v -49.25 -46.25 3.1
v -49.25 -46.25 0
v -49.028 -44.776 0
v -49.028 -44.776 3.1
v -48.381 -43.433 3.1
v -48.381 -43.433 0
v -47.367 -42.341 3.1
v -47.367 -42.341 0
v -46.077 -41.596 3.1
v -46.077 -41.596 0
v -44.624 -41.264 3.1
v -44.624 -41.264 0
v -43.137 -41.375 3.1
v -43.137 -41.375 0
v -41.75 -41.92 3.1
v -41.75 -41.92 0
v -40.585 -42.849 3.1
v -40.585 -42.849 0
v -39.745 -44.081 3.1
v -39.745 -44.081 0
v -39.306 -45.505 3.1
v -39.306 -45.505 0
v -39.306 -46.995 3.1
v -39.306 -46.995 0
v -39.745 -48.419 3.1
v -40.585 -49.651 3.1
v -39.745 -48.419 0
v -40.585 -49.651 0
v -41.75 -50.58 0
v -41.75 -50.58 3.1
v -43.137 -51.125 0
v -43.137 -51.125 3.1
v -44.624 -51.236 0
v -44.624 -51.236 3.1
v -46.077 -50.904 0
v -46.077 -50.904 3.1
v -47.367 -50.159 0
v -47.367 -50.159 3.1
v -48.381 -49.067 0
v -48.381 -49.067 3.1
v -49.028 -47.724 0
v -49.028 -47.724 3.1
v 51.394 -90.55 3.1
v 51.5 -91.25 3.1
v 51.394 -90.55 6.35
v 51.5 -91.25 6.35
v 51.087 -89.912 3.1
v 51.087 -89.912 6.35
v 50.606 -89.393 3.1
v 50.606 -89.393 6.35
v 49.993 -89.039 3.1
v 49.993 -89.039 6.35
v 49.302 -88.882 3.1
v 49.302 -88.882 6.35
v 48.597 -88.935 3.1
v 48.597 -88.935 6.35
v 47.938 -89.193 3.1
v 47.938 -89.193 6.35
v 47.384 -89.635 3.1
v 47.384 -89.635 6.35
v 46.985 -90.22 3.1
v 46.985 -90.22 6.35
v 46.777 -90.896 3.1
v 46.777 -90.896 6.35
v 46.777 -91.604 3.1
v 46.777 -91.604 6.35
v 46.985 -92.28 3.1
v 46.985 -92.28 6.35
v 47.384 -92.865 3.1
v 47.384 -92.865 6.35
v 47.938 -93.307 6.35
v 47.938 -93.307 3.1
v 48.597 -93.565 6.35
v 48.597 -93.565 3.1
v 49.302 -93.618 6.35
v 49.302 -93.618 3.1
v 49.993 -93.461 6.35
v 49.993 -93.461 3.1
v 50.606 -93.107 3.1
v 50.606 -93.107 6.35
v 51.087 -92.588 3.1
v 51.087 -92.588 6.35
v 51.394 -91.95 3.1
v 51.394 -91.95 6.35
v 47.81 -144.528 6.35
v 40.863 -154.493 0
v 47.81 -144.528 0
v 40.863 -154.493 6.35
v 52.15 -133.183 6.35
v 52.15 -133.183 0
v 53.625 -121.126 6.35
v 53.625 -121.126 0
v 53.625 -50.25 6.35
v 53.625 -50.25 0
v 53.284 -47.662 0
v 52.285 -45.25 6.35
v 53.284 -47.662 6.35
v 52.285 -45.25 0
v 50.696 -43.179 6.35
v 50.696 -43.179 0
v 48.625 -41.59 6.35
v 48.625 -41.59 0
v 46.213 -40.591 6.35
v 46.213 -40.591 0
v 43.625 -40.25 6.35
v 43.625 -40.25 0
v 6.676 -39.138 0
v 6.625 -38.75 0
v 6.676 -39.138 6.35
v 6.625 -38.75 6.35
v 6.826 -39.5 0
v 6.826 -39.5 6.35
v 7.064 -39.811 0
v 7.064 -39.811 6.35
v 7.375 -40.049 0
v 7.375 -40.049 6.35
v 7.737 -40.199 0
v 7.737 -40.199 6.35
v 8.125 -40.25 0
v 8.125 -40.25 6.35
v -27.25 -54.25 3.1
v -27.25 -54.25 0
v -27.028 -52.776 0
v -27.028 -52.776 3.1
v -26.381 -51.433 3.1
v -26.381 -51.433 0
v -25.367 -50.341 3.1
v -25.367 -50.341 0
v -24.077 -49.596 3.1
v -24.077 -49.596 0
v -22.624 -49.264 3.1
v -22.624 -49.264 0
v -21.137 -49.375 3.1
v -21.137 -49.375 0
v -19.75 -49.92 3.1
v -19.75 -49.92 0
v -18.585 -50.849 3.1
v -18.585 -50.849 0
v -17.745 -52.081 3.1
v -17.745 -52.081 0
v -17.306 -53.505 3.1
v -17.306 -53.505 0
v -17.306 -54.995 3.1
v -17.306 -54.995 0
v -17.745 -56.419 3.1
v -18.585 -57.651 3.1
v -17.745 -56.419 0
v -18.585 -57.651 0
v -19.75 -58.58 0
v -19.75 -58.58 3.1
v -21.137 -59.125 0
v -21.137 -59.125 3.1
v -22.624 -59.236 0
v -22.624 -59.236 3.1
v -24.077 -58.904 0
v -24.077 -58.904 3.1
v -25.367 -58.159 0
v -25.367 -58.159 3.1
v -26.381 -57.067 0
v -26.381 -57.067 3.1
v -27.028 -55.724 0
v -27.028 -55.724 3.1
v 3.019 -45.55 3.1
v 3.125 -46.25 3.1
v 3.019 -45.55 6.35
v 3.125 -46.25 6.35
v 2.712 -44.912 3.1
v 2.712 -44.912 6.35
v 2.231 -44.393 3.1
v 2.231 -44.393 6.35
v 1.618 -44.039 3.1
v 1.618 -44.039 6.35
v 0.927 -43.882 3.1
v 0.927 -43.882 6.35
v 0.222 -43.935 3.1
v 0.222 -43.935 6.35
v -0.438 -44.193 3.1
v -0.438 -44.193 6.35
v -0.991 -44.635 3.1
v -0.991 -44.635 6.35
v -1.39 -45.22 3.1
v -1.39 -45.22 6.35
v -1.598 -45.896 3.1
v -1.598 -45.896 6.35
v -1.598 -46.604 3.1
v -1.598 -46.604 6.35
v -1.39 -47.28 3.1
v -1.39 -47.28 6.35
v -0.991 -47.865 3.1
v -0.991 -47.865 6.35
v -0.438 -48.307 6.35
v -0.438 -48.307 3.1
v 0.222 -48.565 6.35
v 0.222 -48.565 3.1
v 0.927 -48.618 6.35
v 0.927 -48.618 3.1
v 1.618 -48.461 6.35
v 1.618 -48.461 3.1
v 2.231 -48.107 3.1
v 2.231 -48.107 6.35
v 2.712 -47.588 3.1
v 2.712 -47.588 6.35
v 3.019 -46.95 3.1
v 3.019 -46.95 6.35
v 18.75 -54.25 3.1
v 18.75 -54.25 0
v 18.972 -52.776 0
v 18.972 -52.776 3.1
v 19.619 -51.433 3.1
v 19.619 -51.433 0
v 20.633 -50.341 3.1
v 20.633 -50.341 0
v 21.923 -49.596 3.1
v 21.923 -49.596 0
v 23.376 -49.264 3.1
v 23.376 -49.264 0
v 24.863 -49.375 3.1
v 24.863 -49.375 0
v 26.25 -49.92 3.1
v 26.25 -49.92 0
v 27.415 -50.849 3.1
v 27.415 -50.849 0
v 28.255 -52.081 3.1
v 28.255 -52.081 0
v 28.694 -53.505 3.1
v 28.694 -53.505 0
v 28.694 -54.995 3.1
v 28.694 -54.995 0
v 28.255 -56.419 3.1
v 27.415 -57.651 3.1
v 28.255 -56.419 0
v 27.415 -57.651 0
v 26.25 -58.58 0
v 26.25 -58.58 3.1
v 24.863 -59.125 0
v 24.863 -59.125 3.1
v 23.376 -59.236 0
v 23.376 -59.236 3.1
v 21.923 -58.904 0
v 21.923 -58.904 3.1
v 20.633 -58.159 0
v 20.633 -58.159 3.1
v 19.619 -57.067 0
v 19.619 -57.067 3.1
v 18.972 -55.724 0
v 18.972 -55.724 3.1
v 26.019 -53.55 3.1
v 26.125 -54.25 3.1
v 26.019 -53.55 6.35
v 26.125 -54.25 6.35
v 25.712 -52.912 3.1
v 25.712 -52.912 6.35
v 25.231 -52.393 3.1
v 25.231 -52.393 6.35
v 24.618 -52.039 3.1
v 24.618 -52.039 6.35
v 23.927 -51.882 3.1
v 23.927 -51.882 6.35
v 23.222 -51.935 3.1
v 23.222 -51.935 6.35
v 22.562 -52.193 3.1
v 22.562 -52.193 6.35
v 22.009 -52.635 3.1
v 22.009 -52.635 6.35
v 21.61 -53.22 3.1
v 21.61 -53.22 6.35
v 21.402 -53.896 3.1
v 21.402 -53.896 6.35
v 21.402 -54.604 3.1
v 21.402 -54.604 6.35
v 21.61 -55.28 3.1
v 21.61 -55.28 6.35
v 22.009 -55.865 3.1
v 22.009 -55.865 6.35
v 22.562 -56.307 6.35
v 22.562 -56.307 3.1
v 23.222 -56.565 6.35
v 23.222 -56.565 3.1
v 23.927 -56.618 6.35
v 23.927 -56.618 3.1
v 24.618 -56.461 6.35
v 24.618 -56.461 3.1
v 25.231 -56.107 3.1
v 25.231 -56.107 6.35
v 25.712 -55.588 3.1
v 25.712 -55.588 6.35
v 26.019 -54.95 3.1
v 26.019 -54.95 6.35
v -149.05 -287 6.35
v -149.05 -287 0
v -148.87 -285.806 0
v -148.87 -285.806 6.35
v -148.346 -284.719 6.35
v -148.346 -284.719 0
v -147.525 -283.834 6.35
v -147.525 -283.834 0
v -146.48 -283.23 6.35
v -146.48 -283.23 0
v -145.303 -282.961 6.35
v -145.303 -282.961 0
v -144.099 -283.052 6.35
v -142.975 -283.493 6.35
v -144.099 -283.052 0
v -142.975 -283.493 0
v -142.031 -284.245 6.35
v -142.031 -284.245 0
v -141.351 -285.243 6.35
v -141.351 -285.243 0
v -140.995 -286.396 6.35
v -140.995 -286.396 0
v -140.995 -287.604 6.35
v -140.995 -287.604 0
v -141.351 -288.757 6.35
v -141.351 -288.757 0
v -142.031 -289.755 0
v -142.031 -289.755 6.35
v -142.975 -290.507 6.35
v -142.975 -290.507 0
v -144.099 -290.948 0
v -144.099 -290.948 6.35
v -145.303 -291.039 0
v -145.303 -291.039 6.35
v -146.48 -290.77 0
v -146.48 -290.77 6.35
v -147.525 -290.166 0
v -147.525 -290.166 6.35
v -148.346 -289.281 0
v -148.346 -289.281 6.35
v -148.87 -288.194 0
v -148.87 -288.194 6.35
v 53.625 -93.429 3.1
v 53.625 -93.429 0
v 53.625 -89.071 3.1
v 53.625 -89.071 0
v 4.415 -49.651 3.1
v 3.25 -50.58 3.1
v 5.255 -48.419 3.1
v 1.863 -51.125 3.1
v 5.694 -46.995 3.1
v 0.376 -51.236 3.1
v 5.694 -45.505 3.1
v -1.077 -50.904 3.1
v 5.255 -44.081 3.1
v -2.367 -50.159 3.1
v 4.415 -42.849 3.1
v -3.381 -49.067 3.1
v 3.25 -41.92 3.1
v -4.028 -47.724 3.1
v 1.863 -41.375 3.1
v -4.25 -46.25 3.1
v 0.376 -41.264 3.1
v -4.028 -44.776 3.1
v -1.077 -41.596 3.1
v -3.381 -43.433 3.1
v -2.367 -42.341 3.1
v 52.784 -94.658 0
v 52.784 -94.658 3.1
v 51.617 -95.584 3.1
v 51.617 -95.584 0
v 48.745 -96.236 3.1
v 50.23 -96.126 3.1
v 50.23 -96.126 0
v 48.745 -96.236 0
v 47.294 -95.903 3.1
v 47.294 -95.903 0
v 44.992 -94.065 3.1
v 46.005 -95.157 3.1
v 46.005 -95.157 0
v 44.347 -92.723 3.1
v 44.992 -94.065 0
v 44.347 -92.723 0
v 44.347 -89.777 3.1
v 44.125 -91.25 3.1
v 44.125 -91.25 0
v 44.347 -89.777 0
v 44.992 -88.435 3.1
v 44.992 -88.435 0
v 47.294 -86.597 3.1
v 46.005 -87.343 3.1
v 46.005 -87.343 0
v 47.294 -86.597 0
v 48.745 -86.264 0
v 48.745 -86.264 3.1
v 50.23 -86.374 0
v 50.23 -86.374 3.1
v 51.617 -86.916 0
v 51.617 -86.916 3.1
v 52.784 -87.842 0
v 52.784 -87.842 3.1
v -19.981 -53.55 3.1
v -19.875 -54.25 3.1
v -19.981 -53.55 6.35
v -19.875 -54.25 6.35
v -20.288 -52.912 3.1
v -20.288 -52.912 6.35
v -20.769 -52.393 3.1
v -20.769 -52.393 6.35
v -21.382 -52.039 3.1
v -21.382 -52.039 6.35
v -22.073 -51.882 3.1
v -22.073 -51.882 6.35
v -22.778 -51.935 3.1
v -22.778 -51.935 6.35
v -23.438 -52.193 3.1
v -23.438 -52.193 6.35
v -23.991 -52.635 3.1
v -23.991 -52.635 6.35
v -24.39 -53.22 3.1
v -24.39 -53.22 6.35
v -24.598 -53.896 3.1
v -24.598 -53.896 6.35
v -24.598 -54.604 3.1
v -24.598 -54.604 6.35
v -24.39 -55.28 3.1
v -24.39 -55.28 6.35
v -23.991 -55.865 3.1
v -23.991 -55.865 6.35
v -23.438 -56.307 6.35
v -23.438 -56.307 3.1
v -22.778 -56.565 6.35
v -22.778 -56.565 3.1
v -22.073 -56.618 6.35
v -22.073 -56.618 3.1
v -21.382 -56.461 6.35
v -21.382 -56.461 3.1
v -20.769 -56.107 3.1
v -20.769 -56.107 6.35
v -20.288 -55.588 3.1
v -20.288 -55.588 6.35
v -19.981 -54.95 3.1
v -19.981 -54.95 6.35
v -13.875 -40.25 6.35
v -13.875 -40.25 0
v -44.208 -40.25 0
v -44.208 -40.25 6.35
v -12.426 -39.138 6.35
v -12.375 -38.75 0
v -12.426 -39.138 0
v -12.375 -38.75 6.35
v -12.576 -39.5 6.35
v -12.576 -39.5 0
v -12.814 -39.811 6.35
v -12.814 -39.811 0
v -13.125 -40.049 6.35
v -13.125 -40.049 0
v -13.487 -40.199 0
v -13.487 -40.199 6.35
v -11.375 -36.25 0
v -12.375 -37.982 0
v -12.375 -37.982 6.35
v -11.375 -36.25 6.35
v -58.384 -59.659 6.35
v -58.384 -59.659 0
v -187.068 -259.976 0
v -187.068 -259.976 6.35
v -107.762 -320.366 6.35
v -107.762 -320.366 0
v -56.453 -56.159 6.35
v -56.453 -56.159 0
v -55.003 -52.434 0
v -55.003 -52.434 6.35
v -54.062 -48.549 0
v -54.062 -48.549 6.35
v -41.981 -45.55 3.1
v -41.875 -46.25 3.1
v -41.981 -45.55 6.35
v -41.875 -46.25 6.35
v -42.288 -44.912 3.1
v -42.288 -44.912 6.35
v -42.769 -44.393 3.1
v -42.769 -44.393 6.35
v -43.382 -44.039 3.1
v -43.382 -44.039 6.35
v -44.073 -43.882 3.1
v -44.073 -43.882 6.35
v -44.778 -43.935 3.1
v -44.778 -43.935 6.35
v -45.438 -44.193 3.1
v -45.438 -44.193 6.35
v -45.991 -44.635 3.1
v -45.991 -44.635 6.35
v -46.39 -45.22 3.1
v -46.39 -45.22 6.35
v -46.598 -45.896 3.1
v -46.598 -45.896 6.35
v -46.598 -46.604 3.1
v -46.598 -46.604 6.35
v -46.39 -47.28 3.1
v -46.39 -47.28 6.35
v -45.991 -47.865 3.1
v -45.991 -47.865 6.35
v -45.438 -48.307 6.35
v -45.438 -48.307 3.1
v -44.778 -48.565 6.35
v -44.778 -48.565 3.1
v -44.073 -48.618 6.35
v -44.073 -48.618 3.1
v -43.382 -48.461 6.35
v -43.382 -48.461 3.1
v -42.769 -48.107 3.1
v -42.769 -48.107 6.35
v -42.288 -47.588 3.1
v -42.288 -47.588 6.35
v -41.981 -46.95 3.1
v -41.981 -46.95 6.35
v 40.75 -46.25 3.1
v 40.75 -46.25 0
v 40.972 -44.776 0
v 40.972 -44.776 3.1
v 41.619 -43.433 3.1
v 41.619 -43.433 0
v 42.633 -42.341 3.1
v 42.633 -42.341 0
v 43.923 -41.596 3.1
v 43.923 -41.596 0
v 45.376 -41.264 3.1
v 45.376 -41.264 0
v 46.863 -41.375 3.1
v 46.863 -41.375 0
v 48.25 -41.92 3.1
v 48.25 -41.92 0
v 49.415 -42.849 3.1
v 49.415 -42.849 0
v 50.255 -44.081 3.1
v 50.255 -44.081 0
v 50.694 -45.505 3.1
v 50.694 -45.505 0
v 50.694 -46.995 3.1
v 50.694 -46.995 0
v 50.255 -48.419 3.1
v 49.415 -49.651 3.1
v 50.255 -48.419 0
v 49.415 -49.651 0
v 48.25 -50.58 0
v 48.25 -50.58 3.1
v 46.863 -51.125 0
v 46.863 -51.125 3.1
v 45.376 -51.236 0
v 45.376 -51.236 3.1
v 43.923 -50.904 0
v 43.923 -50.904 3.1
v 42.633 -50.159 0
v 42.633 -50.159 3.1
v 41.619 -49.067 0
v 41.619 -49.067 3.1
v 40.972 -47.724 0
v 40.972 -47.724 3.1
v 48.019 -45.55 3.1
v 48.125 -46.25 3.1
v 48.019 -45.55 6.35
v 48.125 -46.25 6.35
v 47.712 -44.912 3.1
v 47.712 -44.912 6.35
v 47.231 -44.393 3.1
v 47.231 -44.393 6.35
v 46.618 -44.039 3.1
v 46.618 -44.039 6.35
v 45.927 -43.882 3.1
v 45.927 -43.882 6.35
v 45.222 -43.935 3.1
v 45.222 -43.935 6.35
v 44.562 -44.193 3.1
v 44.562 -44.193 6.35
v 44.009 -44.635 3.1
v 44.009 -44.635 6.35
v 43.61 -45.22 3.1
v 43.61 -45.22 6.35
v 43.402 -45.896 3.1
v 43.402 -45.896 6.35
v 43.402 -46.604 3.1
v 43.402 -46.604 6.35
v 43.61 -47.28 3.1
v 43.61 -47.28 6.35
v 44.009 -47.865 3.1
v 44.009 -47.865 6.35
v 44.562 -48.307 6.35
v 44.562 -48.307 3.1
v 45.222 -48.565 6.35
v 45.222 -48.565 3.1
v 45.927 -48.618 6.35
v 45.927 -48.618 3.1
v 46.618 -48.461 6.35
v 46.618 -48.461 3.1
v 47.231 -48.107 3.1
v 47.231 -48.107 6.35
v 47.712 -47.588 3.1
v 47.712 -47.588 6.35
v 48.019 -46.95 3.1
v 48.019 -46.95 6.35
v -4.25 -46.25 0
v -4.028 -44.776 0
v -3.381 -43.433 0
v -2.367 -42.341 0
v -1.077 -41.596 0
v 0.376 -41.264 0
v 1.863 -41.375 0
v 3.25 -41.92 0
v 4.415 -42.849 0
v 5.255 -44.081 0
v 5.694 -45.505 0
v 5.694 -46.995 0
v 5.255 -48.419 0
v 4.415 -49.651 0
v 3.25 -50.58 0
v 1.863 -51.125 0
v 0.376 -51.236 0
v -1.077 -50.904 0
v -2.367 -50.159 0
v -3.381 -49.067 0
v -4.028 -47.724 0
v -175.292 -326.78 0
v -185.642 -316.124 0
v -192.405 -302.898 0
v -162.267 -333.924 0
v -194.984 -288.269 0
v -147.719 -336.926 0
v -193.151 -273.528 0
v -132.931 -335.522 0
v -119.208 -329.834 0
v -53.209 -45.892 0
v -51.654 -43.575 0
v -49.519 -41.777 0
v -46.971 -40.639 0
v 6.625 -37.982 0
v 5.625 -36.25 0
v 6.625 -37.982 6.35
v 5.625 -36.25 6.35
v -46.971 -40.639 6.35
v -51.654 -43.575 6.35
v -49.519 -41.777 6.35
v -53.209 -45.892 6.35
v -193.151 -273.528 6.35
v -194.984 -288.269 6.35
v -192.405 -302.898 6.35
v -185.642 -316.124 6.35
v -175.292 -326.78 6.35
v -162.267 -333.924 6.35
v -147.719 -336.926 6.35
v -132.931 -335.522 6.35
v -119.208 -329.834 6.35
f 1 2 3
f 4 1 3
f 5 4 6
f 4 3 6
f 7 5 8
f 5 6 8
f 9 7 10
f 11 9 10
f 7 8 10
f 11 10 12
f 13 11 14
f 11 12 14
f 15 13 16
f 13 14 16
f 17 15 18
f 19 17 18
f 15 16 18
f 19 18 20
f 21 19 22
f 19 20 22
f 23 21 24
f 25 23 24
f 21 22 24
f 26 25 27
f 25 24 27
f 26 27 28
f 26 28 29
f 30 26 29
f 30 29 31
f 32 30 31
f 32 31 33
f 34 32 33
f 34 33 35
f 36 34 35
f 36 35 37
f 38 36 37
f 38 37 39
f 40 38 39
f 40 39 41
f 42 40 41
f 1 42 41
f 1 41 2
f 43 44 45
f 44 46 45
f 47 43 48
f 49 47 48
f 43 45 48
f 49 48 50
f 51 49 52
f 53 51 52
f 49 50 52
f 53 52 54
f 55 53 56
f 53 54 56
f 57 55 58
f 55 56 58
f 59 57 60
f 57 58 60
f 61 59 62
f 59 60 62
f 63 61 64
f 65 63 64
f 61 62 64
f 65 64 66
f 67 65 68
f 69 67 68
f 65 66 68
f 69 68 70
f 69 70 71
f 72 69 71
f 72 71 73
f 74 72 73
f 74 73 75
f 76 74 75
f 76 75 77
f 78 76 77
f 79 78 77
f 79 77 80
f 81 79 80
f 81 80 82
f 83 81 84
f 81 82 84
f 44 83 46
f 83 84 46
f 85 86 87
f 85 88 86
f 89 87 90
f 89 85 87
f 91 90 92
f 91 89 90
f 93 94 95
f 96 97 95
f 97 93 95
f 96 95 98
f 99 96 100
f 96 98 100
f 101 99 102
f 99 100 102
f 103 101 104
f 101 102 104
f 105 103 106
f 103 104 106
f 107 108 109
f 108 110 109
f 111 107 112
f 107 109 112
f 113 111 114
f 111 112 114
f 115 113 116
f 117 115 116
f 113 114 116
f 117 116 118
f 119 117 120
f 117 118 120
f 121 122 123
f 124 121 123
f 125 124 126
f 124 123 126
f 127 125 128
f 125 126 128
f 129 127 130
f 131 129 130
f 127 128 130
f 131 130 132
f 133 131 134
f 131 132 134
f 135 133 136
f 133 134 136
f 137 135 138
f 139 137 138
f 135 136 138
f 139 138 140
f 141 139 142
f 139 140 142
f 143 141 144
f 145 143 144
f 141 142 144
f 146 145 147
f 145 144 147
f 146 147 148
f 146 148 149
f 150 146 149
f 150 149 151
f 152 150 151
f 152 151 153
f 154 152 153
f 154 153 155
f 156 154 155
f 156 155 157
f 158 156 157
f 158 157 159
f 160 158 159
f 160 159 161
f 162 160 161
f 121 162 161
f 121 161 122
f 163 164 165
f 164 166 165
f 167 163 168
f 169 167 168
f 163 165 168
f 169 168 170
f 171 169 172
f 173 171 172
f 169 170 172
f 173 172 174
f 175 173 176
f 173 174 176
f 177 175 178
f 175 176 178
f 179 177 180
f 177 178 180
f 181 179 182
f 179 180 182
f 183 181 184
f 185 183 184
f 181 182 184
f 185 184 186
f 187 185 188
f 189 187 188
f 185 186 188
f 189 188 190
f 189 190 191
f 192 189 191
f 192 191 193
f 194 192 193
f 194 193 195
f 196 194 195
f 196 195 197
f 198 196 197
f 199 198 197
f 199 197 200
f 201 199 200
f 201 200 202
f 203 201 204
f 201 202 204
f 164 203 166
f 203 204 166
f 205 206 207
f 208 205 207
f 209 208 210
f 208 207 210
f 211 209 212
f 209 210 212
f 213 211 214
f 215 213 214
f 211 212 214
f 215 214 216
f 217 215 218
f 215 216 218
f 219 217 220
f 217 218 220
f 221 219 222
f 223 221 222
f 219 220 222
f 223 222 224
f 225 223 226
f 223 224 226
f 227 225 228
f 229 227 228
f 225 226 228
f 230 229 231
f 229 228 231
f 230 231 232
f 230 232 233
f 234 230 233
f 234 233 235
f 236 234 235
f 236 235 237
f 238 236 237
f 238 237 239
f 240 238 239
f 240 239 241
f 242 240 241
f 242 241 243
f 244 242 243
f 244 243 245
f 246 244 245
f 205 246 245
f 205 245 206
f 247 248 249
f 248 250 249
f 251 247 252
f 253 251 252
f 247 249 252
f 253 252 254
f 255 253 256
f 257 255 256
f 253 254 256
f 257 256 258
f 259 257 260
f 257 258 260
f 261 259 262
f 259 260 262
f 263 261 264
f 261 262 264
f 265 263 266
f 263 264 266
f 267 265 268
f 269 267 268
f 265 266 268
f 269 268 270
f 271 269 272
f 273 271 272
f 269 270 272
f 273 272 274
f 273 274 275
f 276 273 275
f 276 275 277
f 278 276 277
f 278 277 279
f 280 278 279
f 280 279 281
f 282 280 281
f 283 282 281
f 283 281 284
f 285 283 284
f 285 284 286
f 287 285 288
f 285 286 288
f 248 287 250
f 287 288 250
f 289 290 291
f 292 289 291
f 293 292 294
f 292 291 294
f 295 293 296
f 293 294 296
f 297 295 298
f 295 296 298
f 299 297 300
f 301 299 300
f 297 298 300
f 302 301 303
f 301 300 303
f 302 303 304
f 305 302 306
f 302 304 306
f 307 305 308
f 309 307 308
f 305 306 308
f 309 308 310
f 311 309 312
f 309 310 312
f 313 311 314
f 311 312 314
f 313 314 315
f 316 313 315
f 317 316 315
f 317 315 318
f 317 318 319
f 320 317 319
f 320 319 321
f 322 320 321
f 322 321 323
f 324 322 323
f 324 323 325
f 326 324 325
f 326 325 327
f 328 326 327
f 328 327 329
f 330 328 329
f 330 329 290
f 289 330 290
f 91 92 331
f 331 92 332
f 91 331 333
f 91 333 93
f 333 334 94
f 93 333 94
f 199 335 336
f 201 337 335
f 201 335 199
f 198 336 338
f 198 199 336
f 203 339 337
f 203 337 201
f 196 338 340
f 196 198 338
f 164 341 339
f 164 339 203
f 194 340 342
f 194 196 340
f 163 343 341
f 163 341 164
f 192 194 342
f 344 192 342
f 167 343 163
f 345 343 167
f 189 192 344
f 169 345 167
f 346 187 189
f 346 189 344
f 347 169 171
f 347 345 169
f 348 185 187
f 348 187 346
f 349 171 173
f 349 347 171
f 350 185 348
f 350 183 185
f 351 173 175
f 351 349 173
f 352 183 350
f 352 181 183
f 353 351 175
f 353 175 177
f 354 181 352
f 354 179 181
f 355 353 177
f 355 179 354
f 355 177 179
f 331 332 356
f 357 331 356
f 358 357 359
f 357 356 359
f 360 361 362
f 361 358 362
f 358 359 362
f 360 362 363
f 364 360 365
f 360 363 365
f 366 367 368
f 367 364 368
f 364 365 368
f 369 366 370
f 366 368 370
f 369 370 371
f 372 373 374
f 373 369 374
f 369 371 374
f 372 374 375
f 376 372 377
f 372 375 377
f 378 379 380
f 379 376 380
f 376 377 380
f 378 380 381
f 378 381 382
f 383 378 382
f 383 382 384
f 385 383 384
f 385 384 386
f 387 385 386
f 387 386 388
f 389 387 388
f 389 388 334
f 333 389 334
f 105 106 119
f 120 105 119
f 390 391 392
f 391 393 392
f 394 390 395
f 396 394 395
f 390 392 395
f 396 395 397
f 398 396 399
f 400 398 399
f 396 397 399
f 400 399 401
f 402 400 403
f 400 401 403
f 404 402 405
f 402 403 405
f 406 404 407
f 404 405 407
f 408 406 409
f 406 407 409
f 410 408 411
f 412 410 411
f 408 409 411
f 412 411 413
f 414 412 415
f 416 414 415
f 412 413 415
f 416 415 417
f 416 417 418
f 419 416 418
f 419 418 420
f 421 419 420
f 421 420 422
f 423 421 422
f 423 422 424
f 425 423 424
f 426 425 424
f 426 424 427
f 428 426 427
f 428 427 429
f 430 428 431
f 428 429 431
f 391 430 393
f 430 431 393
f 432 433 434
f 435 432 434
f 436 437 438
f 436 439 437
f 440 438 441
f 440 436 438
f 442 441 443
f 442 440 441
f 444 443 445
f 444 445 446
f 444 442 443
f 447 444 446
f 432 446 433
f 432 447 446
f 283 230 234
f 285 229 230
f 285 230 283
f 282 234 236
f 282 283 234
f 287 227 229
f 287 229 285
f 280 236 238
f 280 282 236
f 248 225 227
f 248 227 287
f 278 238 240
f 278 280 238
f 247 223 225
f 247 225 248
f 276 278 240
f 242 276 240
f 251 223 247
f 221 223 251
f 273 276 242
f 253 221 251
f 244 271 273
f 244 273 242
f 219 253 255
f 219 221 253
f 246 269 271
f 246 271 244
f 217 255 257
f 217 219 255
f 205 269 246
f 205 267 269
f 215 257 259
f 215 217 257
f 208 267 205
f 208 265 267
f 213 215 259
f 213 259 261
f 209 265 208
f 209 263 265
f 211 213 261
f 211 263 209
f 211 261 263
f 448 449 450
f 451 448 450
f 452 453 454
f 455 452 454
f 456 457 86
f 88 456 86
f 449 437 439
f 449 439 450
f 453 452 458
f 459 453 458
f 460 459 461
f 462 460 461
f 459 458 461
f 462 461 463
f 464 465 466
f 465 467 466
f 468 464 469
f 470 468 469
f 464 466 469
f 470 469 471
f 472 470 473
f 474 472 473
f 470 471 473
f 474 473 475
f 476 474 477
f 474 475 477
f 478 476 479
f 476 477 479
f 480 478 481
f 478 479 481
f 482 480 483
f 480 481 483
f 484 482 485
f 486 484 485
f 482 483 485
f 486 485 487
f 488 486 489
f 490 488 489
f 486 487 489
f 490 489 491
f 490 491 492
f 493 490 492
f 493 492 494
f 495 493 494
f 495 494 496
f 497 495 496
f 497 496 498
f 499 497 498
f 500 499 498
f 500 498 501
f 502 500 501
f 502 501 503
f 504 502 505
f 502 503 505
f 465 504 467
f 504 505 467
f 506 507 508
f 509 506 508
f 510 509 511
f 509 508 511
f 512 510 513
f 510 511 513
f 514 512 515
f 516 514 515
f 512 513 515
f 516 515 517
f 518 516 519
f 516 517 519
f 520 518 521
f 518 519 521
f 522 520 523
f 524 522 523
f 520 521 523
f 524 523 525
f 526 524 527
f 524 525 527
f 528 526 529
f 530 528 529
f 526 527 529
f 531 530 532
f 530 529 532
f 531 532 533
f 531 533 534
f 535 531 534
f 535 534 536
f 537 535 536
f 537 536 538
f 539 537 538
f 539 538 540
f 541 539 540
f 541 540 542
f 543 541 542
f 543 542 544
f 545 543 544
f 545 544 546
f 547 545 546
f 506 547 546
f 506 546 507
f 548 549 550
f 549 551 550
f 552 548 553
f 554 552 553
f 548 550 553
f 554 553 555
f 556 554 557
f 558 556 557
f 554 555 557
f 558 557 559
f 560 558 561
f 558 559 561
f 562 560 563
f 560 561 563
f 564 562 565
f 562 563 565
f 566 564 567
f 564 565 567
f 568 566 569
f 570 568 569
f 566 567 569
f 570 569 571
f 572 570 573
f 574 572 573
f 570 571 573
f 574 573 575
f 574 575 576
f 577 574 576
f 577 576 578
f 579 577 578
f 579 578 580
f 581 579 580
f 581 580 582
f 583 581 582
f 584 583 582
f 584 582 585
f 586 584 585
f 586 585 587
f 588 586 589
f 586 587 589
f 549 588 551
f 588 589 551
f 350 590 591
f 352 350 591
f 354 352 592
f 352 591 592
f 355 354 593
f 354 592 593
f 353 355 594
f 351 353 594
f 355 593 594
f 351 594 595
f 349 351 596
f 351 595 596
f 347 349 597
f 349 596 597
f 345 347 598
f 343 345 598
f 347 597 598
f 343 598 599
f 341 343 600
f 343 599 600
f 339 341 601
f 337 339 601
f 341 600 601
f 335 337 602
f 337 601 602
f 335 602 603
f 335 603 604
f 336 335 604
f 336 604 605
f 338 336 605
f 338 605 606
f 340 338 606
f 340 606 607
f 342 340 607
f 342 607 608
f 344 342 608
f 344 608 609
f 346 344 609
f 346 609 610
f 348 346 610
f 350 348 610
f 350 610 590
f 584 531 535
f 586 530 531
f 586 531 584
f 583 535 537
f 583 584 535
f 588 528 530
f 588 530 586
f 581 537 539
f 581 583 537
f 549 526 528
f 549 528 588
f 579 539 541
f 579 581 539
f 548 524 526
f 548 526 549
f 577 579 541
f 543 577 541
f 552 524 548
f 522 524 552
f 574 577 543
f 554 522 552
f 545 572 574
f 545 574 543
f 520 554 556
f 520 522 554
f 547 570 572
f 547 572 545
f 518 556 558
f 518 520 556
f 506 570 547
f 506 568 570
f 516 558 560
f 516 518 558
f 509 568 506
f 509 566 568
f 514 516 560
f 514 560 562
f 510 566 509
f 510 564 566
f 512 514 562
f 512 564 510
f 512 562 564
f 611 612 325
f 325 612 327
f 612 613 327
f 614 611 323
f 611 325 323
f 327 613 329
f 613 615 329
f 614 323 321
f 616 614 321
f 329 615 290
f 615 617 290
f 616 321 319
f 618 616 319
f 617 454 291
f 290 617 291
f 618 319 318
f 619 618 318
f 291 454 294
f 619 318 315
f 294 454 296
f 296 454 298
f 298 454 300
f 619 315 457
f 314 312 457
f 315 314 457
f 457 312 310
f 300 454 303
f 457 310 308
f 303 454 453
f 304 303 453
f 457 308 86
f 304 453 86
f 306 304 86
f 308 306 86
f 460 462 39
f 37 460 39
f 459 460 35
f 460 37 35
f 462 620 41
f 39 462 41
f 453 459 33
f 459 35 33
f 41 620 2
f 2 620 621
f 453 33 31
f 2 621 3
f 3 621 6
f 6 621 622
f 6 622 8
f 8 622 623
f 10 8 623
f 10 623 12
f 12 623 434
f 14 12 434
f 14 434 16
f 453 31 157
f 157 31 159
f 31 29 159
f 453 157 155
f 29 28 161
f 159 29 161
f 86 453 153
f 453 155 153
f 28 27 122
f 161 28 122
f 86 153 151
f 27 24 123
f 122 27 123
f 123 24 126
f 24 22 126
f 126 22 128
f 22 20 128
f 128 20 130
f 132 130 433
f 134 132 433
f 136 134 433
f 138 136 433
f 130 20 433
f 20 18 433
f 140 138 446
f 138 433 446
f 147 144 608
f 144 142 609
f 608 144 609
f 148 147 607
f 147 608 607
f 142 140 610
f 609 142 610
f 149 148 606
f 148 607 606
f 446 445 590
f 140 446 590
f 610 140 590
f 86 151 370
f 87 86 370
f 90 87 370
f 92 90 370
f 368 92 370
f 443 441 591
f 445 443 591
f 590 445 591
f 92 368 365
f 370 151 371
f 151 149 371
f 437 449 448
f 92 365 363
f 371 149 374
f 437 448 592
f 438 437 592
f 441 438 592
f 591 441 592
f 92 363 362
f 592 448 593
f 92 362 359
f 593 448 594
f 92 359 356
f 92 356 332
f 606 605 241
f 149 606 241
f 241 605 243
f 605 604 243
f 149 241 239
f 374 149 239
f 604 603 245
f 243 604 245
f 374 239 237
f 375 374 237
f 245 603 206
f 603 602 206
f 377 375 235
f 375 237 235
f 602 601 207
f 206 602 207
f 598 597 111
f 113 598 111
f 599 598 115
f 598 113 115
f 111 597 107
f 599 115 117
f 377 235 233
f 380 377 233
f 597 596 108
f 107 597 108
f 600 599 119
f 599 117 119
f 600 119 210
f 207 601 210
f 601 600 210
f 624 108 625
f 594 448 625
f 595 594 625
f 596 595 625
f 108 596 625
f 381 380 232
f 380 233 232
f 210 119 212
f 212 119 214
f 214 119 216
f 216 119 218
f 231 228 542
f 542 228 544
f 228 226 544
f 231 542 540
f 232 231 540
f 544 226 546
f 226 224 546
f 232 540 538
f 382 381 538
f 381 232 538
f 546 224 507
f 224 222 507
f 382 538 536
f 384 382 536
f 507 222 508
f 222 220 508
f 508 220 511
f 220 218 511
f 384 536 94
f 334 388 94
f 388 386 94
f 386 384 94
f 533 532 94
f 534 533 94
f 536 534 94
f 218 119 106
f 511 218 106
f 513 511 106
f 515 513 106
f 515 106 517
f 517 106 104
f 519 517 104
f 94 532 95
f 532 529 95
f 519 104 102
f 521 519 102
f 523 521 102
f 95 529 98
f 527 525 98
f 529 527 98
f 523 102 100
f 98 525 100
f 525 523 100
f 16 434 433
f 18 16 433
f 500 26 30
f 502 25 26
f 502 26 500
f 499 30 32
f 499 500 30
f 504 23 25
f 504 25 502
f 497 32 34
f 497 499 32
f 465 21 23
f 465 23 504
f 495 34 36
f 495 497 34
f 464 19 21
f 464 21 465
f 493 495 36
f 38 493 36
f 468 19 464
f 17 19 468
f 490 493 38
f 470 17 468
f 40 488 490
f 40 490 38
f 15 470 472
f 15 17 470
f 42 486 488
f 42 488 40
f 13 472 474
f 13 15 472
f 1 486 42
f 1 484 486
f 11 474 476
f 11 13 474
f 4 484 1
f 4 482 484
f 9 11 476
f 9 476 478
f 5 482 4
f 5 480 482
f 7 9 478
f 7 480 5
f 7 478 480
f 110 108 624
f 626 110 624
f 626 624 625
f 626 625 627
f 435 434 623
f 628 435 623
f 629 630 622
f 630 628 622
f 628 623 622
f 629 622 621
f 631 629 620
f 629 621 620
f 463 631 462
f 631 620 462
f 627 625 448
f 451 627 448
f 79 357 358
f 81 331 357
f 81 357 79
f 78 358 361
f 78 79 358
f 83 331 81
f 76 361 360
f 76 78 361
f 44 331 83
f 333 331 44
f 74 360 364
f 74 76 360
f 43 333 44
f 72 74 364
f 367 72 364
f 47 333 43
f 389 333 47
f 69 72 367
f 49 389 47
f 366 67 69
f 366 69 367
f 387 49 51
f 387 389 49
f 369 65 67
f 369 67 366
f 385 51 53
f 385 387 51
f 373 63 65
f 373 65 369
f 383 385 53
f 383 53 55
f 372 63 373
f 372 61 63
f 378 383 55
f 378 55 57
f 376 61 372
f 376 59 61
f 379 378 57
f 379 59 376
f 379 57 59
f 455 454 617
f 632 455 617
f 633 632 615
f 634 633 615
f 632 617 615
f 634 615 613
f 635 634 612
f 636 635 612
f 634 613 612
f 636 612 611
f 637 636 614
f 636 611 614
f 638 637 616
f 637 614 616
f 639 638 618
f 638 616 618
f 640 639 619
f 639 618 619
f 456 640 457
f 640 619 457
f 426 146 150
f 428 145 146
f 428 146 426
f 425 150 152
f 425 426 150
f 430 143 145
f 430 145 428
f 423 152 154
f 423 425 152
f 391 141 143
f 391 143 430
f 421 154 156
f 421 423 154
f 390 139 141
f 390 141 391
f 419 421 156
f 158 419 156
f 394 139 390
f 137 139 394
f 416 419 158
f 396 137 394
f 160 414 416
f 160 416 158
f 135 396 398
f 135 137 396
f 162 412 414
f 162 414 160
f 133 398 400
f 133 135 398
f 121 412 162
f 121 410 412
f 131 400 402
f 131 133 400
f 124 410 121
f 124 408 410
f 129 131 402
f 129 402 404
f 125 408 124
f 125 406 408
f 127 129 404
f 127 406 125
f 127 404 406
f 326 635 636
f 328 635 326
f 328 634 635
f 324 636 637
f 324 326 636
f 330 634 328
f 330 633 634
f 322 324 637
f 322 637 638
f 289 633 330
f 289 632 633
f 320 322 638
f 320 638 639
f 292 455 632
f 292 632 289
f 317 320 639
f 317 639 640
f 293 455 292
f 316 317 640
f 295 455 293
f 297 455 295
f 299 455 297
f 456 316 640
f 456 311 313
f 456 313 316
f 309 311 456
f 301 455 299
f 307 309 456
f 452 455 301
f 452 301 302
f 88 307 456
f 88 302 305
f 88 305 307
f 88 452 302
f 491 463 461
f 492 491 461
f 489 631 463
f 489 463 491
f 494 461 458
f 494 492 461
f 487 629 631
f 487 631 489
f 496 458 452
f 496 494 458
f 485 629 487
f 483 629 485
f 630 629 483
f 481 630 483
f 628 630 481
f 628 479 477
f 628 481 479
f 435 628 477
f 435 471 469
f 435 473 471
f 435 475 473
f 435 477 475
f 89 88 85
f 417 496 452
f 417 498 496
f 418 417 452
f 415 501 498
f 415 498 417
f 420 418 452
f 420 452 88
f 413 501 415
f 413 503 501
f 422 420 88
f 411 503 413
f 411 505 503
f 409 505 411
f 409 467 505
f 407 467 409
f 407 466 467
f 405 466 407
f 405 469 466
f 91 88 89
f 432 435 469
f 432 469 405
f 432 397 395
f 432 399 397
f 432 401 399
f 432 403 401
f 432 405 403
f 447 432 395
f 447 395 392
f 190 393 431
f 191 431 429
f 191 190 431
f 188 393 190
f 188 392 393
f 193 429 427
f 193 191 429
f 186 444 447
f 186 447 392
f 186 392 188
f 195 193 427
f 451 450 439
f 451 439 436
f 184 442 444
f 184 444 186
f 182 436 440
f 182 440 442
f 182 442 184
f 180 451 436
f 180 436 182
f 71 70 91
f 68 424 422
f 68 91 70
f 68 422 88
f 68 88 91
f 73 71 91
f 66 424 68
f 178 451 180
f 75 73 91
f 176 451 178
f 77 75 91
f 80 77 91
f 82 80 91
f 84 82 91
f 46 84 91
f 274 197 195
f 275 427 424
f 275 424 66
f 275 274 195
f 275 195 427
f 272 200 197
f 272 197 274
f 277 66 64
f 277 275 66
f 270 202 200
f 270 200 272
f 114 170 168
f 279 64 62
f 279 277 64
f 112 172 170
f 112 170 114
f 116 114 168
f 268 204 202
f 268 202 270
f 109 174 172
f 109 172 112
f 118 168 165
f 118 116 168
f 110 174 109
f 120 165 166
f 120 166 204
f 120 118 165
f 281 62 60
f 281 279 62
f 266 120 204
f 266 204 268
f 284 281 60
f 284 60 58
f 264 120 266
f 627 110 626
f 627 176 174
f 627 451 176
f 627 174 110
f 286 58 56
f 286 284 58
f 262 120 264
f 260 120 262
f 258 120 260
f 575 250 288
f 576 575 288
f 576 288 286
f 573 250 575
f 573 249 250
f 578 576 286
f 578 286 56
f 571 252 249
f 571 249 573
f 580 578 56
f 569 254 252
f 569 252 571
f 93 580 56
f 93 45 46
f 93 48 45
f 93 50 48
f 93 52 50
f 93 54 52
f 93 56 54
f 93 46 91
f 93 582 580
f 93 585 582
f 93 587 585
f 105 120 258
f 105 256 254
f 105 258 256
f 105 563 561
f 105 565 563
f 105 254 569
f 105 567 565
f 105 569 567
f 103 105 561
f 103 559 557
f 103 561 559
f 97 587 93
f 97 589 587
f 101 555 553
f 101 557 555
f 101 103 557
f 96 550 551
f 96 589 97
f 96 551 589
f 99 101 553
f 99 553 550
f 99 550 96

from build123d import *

# Parameters (mm, degrees)
BOSS_EXTRUDE1_DEPTH            = 6.35
FILLET1_R                      = 50
FILLET2_R                      = 30
SKETCH2_R                      = 4.05
CUT_EXTRUDE1_DEPTH             = 390.402519894
SKETCH4_W                      = 19
SKETCH4_H                      = 4
BOSS_EXTRUDE3_DEPTH            = 6.35
CHAMFER1_SIZE                  = 1
CHAMFER1_SIZE2                 = 1.732050808
FILLET3_R                      = 1.5
FILLET8_R                      = 10
CBORE_FOR_M5_SHCS2_D           = 4.75
CBORE_FOR_M5_SHCS2_CBORE_D     = 10
CBORE_FOR_M5_SHCS2_CBORE_DEPTH = 3.1


with BuildPart() as part:
    # Sketch1 → Boss-Extrude1 (new body)
    with BuildSketch(Plane.XY):
        Polygon((53.625, -52.25), (53.625, -40.25), (40.25, -40.25), (-40.25, -40.25), (-53.625, -40.25), (-53.625, -52.25), align=None)
        with BuildLine():
            Line((53.625, -140.25), (53.625, -52.25))
            Line((53.625, -52.25), (-53.625, -52.25))
            Line((-53.625, -52.25), (-187.067700458, -259.975777937))
            ThreePointArc((-187.067700458, -259.975777937), (-175.291577032, -326.779647572), (-107.761575635, -320.366146777))
            Line((-107.761575635, -320.366146777), (53.625, -140.25))
        make_face()
    extrude(amount=BOSS_EXTRUDE1_DEPTH)

    # Fillet1
    fillet1_edges = [part.edges().sort_by_distance(p)[0] for p in [
        (53.625, -140.25, 3.175),
    ]]
    fillet(fillet1_edges, radius=FILLET1_R)

    # Fillet2
    fillet2_edges = [part.edges().sort_by_distance(p)[0] for p in [
        (-53.625, -52.25, 3.175),
    ]]
    fillet(fillet2_edges, radius=FILLET2_R)

    # Sketch2 → Cut-Extrude1 (cut, through all)
    with BuildSketch(Plane(origin=(0, 0, 0), x_dir=(-1, 0, 0), z_dir=(0, 0, -1))):
        with Locations((145, -287)):
            Circle(SKETCH2_R)
    extrude(amount=-CUT_EXTRUDE1_DEPTH, mode=Mode.SUBTRACT)

    # Sketch4 → Boss-Extrude3 (add)
    with BuildSketch(Plane(origin=(0, 0, 0), x_dir=(-1, 0, 0), z_dir=(0, 0, -1))):
        with Locations((2.875, -38.25)):
            Rectangle(SKETCH4_W, SKETCH4_H)
    extrude(amount=-BOSS_EXTRUDE3_DEPTH)

    # Chamfer1
    chamfer1_edges = [part.edges().sort_by_distance(p)[0] for p in [
        (-12.375, -36.25, 3.175),
        (6.625, -36.25, 3.175),
    ]]
    chamfer1_side = [part.faces().sort_by_distance(p)[0] for p in [
        (-2.875, -36.25, 3.175),
    ]]
    chamfer(chamfer1_edges, length=CHAMFER1_SIZE, length2=CHAMFER1_SIZE2, reference=chamfer1_side[0])

    # Fillet3
    fillet3_edges = [part.edges().sort_by_distance(p)[0] for p in [
        (-12.375, -40.25, 3.175),
        (6.625, -40.25, 3.175),
    ]]
    fillet(fillet3_edges, radius=FILLET3_R)

    # Fillet8
    # the kernel refuses this fillet: 10 mm, written as the material it takes off along each edge
    with BuildSketch(Plane(origin=(53.625, -40.25, -25), x_dir=(-1, 0, 0), z_dir=(0, 0, 1))) as fillet8_piece_1:
        with BuildLine():
            CenterArc((FILLET8_R, FILLET8_R), FILLET8_R, 180, 90)
            Line((0, FILLET8_R), (0, 0))
            Line((0, 0), (FILLET8_R, 0))
        make_face()
    extrude(amount=56.35, mode=Mode.SUBTRACT)
    with BuildSketch(Plane(origin=(-53.625, -40.25, -23.541918235), x_dir=(1, 0, 0), z_dir=(0, 0, 1))) as fillet8_piece_2:
        with BuildLine():
            CenterArc((9.416767294, -10), FILLET8_R, 90, 80.203799094)
            Line((-0.43742453, -8.298558404), (-1.422843712, -8.128414244))
            ThreePointArc((-1.422843712, -8.128414244), (-1, -3.194233614), (-1, 0))
            Line((-1, 0), (0, 1))
            Line((0, 1), (9.416767294, 1))
            Line((9.416767294, 1), (9.416767294, 0))
        make_face()
    extrude(amount=53.43383647, mode=Mode.SUBTRACT)

    # CBORE for M5 SHCS2 (through all)
    with Locations(Plane(origin=(0, 0, 0), x_dir=(-1, 0, 0), z_dir=(0, 0, -1))):
        with Locations((-45.75, 26.75), (-45.75, -46.25), (-23.75, -54.25), (-0.75, -46.25), (22.25, -54.25), (44.25, -46.25), (-49.125, -91.25)):
            CounterBoreHole(CBORE_FOR_M5_SHCS2_D / 2, CBORE_FOR_M5_SHCS2_CBORE_D / 2, CBORE_FOR_M5_SHCS2_CBORE_DEPTH)


solid = part.part
